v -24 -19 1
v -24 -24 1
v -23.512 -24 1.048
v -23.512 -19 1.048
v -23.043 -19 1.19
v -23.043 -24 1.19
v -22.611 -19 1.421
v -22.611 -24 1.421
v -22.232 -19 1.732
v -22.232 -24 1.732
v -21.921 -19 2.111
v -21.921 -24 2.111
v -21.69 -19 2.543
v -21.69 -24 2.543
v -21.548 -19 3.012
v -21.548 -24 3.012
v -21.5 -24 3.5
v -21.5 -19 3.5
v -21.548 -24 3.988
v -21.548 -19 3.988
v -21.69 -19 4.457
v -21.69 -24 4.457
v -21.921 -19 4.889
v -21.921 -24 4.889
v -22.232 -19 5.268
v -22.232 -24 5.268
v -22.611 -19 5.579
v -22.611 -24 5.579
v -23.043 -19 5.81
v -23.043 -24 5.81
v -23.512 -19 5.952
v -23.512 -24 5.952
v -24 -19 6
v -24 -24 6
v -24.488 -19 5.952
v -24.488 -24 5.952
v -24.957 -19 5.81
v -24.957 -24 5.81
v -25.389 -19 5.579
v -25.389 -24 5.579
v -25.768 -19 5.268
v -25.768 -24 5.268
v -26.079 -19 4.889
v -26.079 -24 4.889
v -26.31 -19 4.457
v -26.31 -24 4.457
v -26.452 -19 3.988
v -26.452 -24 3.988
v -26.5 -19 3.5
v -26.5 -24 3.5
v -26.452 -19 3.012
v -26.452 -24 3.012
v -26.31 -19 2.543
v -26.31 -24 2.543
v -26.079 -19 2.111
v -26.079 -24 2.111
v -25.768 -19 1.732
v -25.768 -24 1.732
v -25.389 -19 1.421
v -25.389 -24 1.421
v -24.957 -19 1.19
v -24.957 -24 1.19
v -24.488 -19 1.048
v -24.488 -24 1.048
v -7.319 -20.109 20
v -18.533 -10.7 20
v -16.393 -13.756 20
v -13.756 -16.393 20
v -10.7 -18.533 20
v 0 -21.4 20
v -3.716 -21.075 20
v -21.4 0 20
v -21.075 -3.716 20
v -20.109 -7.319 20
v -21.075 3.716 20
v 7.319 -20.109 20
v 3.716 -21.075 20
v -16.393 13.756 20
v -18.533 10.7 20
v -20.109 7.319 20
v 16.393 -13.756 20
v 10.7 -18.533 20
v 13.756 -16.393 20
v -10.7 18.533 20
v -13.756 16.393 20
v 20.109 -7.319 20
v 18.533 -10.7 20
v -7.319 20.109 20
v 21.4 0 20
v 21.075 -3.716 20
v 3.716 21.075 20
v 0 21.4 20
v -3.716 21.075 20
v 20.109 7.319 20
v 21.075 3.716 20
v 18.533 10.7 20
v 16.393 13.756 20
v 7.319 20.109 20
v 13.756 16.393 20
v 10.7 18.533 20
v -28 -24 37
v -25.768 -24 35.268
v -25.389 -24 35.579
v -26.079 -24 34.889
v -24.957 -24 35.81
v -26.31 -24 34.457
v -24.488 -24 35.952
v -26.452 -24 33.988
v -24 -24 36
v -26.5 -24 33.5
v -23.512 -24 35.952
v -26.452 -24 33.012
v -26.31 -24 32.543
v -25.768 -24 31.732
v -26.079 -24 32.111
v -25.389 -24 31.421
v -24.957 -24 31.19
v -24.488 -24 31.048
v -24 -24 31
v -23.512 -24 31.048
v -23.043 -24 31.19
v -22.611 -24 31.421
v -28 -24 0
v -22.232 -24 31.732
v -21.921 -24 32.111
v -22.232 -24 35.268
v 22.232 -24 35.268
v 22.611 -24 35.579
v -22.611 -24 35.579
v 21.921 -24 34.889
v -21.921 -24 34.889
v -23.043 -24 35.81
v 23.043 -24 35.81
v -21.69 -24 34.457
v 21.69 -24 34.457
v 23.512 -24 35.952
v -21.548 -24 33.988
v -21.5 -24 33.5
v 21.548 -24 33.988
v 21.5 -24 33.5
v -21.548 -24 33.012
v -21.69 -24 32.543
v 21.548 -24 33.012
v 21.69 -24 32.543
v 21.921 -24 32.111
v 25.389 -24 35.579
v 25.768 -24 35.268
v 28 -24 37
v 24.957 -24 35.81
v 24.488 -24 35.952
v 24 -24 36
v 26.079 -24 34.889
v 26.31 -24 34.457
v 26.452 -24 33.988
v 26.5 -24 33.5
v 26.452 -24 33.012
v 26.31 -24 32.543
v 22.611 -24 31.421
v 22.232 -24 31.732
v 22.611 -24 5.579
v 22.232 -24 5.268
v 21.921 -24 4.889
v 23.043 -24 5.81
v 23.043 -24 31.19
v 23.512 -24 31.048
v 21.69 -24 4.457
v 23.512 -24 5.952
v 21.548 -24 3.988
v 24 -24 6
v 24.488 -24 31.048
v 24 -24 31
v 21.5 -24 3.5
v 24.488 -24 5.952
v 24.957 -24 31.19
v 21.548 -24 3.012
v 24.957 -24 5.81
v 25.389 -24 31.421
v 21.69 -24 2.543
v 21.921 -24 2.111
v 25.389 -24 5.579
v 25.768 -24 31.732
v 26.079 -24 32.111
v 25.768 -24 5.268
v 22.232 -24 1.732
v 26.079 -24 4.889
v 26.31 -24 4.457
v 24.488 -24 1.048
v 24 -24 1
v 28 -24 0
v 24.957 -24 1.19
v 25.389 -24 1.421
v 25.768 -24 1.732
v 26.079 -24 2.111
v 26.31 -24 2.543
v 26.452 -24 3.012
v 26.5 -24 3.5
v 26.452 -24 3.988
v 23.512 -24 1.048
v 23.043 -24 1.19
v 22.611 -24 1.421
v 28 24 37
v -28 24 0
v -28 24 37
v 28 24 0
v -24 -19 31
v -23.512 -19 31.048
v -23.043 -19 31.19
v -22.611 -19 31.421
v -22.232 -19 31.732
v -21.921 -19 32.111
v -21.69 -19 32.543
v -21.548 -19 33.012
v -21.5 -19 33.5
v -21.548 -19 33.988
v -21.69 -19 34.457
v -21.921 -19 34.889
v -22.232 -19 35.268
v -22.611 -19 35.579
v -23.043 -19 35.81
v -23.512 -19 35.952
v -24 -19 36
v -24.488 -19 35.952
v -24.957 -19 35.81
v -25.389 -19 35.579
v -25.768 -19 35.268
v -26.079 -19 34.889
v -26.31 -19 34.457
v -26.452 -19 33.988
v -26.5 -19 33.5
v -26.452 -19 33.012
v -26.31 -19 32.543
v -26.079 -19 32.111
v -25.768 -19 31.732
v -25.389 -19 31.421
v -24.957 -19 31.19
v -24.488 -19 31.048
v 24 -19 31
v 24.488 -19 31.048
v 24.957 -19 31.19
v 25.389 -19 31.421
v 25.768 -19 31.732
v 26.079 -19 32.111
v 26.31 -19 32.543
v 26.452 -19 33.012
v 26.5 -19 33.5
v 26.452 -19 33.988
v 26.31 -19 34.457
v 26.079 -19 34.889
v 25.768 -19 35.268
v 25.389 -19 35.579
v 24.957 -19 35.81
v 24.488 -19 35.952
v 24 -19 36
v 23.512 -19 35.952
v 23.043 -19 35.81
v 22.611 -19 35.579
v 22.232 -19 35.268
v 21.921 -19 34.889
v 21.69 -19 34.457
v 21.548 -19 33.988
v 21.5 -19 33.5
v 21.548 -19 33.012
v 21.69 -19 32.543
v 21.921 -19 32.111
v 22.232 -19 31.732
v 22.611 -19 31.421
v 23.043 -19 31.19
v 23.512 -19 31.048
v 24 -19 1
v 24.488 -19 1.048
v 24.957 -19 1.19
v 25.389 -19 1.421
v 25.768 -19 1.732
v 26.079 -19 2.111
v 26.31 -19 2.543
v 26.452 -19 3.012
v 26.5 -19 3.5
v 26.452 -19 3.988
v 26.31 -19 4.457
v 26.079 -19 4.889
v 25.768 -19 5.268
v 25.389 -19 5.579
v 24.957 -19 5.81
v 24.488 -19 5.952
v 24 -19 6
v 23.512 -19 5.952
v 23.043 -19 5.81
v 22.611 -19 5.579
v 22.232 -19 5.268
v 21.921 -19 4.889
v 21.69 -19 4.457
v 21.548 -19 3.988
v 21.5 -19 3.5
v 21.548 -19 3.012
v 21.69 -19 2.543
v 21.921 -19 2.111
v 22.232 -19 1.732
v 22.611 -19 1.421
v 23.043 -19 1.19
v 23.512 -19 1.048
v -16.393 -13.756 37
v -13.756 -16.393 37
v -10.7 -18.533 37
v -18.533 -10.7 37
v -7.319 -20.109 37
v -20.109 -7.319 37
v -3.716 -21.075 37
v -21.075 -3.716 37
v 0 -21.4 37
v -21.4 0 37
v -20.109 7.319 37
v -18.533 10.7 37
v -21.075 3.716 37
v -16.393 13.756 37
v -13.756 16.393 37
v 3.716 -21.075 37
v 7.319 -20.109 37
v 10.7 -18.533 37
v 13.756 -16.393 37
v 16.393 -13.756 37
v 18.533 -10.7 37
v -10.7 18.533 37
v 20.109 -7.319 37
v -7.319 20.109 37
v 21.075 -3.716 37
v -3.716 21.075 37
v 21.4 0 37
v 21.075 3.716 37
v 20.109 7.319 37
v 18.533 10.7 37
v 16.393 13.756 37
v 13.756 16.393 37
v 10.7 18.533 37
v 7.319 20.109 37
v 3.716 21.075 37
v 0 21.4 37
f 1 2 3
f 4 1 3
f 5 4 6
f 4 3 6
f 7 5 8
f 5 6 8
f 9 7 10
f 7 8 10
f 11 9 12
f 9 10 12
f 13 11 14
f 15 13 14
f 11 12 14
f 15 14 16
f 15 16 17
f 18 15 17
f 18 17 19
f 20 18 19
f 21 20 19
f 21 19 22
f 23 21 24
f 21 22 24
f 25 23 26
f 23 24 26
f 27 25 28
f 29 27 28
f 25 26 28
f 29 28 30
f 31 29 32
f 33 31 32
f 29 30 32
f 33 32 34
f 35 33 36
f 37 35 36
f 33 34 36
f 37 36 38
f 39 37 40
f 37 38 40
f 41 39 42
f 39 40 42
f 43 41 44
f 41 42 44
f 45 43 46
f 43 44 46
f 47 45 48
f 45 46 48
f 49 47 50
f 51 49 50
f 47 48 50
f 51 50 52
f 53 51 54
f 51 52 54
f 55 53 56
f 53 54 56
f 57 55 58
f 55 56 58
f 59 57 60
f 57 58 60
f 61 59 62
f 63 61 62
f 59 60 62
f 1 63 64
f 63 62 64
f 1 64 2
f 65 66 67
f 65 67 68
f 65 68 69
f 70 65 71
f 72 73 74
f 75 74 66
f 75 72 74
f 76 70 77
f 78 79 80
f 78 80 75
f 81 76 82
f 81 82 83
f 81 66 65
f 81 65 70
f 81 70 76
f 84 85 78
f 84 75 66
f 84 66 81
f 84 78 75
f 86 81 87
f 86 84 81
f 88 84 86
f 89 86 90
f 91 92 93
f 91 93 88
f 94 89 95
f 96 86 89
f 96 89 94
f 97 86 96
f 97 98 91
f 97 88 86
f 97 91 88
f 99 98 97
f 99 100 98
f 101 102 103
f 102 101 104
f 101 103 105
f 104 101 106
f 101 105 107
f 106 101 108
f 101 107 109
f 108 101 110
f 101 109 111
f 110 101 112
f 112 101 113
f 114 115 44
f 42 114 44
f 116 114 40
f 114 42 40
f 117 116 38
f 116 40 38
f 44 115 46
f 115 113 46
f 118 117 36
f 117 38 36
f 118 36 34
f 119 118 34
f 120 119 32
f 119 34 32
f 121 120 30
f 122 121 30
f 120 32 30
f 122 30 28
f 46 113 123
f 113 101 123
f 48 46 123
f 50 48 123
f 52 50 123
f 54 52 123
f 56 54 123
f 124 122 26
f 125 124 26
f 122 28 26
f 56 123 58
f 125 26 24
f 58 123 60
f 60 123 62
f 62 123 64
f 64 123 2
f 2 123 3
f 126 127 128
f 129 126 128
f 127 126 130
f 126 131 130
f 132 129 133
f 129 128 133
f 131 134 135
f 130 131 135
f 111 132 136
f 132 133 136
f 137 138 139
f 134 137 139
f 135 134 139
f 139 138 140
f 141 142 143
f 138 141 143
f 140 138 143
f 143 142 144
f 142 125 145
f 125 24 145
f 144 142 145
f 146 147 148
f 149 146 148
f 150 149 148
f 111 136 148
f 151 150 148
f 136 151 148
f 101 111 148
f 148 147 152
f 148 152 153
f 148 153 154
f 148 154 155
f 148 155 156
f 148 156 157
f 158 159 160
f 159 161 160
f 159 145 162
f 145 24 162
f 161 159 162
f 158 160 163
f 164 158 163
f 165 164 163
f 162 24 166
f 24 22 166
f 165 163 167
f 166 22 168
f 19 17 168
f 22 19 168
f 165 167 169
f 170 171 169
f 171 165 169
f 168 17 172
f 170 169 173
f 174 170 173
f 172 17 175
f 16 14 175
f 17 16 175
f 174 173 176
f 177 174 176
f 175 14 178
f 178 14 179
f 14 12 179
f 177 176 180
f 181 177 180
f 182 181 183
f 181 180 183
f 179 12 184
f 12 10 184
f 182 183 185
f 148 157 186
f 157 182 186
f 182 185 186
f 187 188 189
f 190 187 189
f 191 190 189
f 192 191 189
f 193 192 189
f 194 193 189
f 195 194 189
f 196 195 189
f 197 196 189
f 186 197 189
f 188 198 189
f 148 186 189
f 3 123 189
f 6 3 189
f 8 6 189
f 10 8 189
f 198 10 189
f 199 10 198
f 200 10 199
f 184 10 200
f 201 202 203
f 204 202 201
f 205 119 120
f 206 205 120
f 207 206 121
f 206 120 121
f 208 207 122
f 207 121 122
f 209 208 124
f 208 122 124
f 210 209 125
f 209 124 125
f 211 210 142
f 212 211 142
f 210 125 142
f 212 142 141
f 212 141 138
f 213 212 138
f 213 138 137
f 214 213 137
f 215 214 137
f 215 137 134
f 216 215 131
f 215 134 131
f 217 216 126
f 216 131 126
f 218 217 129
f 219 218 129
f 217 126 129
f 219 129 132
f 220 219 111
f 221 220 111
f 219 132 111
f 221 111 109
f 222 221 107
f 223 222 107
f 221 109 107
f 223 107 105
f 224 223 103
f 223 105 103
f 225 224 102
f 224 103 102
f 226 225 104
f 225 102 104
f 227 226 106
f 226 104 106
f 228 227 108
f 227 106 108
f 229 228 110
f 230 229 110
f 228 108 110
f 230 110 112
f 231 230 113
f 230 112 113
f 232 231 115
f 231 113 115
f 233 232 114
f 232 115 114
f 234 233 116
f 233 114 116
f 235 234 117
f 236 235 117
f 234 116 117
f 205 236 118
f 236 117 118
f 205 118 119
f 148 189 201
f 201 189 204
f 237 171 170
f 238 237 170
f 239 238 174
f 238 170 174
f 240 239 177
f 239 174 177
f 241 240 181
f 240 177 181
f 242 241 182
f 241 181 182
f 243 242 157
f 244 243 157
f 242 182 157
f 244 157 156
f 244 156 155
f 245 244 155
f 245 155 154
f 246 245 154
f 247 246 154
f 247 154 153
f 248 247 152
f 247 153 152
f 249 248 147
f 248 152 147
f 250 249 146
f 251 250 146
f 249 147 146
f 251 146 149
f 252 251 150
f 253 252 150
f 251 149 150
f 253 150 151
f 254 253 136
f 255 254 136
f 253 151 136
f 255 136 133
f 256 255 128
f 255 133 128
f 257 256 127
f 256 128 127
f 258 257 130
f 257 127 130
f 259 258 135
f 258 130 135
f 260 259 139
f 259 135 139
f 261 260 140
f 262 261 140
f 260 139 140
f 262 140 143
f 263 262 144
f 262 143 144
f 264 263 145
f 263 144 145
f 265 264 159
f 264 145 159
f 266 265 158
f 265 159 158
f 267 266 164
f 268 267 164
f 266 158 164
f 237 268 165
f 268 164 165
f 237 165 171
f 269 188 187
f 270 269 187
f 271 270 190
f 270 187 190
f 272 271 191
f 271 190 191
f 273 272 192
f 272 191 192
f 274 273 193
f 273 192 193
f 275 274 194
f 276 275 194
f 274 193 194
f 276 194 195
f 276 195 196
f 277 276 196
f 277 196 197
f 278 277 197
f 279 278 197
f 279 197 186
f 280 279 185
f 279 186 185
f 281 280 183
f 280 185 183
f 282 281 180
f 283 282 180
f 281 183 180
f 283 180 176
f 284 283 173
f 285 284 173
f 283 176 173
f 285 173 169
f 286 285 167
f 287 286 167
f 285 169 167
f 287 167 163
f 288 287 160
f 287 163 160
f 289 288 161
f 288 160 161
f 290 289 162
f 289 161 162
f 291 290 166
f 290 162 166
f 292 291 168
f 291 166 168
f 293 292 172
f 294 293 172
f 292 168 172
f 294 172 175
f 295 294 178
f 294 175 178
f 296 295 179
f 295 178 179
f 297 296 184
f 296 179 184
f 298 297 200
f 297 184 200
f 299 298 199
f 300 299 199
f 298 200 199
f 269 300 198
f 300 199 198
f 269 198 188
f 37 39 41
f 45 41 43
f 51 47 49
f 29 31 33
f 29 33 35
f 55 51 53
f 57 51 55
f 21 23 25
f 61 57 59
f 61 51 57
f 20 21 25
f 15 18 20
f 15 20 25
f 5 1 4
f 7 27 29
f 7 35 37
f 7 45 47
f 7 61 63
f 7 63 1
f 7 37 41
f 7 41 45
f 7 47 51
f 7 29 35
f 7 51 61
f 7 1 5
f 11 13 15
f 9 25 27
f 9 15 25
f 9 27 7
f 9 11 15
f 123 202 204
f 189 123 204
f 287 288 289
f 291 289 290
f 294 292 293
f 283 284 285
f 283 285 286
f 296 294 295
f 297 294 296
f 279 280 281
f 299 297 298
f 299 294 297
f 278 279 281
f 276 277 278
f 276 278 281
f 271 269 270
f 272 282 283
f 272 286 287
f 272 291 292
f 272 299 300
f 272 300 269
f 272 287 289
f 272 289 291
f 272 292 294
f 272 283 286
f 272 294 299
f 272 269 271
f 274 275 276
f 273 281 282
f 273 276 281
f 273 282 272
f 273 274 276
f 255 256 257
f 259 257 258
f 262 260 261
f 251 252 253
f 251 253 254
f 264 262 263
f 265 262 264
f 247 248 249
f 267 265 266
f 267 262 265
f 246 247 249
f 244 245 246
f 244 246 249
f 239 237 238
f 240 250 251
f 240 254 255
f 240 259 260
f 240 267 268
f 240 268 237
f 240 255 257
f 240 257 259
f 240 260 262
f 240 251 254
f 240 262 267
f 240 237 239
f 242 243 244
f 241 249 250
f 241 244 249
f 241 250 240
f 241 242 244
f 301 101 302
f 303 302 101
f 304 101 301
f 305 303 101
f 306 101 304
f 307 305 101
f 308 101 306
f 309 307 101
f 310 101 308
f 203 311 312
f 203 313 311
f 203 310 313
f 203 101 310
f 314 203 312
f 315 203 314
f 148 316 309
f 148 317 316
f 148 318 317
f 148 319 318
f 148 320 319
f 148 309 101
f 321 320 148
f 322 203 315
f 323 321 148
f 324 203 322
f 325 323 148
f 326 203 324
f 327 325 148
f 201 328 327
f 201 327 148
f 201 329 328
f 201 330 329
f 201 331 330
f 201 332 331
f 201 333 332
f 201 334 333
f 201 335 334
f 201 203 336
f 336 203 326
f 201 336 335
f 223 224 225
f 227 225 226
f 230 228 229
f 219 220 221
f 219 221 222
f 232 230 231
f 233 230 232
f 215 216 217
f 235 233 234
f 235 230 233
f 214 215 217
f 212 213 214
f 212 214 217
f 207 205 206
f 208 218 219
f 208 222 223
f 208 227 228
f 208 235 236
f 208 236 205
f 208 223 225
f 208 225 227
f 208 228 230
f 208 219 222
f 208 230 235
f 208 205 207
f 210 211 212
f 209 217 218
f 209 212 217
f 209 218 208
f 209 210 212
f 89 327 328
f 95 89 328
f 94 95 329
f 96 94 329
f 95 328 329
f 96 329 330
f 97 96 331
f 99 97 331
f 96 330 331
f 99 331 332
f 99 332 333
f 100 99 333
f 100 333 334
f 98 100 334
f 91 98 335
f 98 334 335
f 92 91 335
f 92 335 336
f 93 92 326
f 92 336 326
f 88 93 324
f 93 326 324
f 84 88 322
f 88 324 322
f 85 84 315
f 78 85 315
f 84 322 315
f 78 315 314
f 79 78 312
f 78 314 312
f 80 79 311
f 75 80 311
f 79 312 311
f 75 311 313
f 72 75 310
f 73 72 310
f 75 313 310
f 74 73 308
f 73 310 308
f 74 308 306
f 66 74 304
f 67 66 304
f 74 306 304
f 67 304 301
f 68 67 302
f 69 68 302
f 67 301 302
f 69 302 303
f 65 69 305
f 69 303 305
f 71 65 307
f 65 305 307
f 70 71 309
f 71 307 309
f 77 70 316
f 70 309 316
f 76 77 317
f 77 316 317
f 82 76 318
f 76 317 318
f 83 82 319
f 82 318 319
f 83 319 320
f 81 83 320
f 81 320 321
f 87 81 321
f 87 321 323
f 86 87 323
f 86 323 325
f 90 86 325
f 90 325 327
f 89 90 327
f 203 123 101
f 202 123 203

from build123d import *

# Parameters (mm, degrees)
SKETCH1_W           = 56
SKETCH1_H           = 48
BOSS_EXTRUDE1_DEPTH = 37
SKETCH2_R           = 21.4
CUT_EXTRUDE1_DEPTH  = 17
SKETCH4_R           = 2.5
CUT_EXTRUDE2_DEPTH  = 5


with BuildPart() as part:
    # Sketch1 → Boss-Extrude1 (new body)
    with BuildSketch(Plane.XY):
        Rectangle(SKETCH1_W, SKETCH1_H)
    extrude(amount=BOSS_EXTRUDE1_DEPTH)

    # Sketch2 → Cut-Extrude1 (cut)
    with BuildSketch(Plane.XY.offset(37)):
        Circle(SKETCH2_R)
    extrude(amount=-CUT_EXTRUDE1_DEPTH, mode=Mode.SUBTRACT)

    # Sketch4 → Cut-Extrude2 (cut)
    with BuildSketch(Plane.XZ.offset(24)):
        with Locations(Location((-24, 33.5, 0), (0, 0, 270))):
            Circle(SKETCH4_R)
        with Locations(Location((24, 33.5, 0), (0, 0, 270))):
            Circle(SKETCH4_R)
        with Locations(Location((24, 3.5, 0), (0, 0, 270))):
            Circle(SKETCH4_R)
        with Locations(Location((-24, 3.5, 0), (0, 0, 270))):
            Circle(SKETCH4_R)
    extrude(amount=-CUT_EXTRUDE2_DEPTH, mode=Mode.SUBTRACT)


solid = part.part
